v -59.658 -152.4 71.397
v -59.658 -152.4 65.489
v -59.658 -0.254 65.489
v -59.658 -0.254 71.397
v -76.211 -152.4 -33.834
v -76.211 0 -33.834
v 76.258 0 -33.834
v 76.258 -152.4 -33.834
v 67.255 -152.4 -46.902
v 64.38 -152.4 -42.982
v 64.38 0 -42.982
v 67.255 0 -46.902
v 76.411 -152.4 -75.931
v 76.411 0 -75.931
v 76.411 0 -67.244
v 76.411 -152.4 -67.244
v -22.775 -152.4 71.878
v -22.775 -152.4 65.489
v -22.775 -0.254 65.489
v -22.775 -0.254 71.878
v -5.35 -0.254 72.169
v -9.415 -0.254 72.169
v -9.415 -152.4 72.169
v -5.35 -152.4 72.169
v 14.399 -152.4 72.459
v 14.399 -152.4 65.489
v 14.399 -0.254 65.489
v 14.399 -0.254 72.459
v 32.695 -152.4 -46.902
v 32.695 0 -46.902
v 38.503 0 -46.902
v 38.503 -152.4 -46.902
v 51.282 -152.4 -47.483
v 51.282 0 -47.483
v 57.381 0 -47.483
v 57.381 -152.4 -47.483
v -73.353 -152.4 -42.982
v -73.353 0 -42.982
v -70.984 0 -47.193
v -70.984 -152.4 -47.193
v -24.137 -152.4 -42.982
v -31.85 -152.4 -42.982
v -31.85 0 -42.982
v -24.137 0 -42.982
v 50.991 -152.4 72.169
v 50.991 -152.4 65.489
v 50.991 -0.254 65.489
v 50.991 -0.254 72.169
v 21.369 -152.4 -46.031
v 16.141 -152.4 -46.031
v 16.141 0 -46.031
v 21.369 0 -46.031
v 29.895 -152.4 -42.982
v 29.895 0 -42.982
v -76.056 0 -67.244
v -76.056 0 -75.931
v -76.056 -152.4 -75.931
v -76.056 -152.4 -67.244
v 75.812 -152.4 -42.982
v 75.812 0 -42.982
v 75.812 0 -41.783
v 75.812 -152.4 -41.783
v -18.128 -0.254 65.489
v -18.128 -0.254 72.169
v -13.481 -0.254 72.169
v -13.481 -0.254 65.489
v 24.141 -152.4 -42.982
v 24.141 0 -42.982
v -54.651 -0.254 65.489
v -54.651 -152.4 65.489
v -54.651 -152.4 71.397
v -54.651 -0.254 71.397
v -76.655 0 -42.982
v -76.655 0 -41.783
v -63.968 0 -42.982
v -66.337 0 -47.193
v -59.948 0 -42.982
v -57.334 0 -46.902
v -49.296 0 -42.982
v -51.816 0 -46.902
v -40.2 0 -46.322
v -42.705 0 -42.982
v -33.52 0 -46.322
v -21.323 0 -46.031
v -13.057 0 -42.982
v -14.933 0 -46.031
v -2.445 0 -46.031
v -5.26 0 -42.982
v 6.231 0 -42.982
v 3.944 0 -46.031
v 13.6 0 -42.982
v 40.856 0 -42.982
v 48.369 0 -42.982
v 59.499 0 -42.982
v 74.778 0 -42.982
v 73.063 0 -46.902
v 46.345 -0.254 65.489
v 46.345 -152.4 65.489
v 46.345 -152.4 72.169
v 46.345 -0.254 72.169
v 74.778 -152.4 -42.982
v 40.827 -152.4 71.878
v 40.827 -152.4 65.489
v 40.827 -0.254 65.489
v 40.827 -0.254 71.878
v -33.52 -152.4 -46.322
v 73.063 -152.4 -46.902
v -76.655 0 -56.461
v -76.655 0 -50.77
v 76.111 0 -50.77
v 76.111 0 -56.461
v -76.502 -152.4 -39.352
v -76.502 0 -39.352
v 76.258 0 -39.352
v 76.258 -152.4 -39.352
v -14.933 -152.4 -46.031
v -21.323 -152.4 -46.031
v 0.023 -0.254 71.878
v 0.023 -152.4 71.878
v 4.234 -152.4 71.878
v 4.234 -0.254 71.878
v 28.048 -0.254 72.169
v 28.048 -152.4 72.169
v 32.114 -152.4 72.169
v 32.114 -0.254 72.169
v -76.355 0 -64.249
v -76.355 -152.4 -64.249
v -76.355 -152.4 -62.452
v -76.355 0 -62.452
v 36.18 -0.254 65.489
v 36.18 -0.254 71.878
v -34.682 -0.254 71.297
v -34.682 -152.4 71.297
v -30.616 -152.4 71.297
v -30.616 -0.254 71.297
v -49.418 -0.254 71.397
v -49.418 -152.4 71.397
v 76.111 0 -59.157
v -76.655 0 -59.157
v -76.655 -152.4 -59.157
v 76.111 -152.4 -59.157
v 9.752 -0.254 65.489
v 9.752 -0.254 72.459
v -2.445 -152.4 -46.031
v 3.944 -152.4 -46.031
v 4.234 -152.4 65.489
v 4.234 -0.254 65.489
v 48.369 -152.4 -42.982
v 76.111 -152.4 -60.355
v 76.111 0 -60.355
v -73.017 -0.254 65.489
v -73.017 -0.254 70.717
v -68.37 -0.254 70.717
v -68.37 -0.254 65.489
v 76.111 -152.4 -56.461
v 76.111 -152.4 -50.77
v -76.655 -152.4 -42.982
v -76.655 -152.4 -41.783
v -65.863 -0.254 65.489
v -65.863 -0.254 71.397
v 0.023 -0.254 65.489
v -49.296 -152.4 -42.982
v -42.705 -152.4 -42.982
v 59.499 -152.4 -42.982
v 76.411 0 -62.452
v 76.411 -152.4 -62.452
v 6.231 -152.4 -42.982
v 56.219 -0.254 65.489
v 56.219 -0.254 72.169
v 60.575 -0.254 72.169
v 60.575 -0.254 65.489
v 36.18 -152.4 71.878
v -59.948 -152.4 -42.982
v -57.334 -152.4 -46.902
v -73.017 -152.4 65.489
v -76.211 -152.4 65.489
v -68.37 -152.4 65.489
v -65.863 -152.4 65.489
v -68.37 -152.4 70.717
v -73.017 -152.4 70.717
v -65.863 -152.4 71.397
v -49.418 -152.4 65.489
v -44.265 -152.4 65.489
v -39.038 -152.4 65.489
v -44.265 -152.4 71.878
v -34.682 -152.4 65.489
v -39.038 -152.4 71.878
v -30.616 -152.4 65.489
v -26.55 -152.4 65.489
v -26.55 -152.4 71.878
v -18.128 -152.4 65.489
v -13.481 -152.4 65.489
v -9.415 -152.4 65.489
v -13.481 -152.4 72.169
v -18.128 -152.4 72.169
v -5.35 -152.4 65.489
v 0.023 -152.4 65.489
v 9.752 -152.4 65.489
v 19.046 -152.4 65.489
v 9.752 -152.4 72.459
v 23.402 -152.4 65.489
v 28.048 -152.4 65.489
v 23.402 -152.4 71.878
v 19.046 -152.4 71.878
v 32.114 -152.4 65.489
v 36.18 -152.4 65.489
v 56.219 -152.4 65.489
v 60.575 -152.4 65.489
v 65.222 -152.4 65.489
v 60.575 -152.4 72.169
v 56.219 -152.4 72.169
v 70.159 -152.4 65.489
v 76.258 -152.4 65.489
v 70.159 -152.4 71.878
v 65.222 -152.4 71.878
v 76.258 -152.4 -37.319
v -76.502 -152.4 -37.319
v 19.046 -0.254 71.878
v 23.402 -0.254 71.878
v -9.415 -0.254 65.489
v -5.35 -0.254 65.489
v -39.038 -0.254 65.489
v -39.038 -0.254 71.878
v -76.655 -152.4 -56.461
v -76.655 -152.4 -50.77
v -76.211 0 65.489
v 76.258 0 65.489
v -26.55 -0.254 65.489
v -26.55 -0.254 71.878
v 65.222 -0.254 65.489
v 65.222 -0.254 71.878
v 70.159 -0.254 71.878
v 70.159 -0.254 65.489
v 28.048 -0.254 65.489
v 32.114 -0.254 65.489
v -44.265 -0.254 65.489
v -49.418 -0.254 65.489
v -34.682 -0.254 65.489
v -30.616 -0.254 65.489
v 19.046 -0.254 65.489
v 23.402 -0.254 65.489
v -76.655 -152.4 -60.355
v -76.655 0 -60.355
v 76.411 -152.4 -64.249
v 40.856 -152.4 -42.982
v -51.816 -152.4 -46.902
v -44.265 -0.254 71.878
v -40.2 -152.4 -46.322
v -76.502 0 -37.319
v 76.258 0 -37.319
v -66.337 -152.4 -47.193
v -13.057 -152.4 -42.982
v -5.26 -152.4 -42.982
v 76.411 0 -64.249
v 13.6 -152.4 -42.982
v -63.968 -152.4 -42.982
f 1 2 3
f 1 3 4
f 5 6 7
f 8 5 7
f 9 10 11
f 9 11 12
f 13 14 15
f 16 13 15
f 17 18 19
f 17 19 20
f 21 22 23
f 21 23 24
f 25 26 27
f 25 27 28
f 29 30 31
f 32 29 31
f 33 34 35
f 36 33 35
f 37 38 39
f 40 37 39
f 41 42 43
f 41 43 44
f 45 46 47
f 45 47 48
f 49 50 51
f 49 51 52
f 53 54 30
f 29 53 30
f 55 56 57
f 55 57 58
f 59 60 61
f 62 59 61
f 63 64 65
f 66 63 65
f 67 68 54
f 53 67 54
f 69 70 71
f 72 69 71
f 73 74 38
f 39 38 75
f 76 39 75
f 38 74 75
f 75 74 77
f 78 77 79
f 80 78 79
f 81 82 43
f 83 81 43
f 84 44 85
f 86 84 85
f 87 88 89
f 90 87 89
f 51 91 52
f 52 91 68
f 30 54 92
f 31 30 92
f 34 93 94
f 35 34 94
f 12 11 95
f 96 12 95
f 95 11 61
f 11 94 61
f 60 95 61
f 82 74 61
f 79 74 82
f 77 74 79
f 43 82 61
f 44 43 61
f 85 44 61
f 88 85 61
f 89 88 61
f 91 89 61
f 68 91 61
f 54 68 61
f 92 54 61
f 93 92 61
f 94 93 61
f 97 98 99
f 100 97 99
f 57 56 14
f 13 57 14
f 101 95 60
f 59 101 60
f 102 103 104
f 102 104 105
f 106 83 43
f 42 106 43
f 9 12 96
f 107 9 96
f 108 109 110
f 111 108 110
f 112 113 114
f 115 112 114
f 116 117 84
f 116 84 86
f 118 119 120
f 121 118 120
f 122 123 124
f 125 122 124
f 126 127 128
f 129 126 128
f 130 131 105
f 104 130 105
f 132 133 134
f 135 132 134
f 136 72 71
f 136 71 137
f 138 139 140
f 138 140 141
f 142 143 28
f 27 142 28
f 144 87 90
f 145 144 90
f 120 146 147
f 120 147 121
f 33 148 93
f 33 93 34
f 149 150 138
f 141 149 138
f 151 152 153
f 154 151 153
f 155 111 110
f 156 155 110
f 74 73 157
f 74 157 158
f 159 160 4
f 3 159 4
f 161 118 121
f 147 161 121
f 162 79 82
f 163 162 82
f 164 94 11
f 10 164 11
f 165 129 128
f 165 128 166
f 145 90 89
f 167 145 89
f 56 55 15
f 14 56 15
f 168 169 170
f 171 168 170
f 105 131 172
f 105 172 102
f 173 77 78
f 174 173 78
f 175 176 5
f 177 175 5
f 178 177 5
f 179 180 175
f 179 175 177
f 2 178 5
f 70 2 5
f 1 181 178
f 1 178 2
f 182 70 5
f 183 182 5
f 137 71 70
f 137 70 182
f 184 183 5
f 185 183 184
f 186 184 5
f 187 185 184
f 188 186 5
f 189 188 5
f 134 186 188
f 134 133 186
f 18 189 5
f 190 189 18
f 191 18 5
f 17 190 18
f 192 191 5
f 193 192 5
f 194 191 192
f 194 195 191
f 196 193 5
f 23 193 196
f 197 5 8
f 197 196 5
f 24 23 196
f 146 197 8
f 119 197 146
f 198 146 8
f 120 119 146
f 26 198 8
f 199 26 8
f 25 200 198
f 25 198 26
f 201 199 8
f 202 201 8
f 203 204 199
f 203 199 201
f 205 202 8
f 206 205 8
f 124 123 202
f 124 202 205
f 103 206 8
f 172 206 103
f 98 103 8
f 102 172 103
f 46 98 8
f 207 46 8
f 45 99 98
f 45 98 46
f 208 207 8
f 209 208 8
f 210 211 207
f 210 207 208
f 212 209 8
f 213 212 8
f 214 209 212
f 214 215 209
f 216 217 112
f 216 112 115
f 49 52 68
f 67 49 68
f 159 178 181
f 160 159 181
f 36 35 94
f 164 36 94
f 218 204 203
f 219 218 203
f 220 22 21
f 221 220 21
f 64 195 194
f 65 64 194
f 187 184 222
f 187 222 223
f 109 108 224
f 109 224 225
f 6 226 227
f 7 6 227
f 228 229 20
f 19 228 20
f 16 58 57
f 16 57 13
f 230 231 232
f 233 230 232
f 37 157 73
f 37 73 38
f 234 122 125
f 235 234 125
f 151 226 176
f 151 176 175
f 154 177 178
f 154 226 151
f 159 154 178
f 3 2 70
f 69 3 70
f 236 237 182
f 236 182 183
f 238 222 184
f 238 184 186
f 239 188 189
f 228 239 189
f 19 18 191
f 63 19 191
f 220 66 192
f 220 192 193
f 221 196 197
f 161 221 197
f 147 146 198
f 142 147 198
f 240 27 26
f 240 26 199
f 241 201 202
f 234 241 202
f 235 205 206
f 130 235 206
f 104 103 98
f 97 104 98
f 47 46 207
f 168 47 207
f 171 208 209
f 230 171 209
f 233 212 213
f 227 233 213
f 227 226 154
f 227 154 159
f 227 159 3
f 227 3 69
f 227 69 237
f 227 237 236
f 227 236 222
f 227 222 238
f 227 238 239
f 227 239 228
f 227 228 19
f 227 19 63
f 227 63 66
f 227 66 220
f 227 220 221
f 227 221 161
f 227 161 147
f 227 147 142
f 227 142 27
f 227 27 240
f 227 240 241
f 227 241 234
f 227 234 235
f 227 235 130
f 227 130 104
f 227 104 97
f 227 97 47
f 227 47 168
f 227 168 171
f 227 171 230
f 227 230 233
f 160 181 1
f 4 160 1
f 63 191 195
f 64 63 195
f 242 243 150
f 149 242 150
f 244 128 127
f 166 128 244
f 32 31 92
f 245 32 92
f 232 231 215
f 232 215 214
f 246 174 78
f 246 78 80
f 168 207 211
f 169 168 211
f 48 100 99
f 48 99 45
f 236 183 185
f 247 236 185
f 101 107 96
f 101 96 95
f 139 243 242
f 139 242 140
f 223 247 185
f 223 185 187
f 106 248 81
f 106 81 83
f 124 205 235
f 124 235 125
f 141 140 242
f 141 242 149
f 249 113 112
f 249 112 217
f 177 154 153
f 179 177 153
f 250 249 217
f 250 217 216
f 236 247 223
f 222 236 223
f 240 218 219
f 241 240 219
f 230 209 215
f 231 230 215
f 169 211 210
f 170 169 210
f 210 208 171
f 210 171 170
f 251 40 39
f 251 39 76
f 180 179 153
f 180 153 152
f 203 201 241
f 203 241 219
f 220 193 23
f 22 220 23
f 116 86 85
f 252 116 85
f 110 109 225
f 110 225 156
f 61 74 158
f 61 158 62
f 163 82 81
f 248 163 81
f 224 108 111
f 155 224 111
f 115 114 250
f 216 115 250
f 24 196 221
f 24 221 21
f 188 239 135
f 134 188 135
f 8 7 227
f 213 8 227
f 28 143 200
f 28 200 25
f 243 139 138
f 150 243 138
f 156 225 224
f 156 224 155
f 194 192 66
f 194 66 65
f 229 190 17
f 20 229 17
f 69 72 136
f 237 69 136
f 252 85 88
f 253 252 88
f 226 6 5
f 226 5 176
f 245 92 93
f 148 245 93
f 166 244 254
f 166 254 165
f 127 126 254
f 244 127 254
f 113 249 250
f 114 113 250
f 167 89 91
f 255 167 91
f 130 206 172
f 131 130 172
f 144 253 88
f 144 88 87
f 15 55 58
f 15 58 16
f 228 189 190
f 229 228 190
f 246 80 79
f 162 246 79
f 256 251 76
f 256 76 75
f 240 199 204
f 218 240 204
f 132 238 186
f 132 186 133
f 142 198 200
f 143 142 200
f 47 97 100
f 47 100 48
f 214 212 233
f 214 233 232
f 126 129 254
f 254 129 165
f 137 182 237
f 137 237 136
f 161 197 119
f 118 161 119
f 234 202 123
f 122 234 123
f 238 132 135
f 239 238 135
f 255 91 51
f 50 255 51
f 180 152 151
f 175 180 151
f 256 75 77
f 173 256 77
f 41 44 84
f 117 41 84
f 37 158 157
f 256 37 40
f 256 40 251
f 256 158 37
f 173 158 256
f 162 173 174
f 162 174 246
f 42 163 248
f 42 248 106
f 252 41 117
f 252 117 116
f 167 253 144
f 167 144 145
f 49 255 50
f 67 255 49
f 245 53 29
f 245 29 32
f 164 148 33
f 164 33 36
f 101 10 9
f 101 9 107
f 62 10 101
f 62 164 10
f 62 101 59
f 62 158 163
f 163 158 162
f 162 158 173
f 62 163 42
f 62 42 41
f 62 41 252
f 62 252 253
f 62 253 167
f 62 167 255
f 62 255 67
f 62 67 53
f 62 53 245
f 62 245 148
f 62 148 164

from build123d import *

# Parameters (mm, degrees)
F0_W      = 152.466349
F0_H      = 8.686692
F1_DEPTH  = 152.4
F2_W      = 152.765885
F2_H      = 1.797248
F3_DEPTH  = 152.4
F4_W      = 152.765892
F4_H      = 1.198161
F5_DEPTH  = 152.4
F6_W      = 152.765892
F6_H      = 5.691275
F7_DEPTH  = 152.4
F8_W      = 152.466349
F8_H      = 1.198165
F9_DEPTH  = 152.4
F10_W     = 152.759567
F10_H     = 2.032921
F11_DEPTH = 152.4
F12_W     = 152.46915
F12_H     = 99.322758
F13_DEPTH = 152.4
F15_DEPTH = 152.4
F17_DEPTH = 152.4
F18_W     = 4.93709
F18_H     = 6.389186
F18_W_2   = 4.356266
F18_H_2   = 6.679602
F18_W_3   = 4.646678
F18_W_4   = 4.065841
F18_W_5   = 4.356261
F18_W_6   = 4.64668
F18_H_3   = 6.970018
F18_W_7   = 4.211054
F18_W_8   = 4.065844
F18_W_9   = 4.646679
F18_W_10  = 3.775427
F18_W_11  = 4.065846
F18_H_4   = 5.808354
F18_W_12  = 5.227514
F18_W_13  = 5.232293
F18_H_5   = 5.907856
F18_W_14  = 6.204977
F19_DEPTH = 152.14629


with BuildPart() as f1:
    # F0 (on Front) → F1 (new body)
    with BuildSketch(Plane.XZ):
        with Locations((0.177506, -71.587801)):
            Rectangle(F0_W, F0_H)
    extrude(amount=F1_DEPTH)


with BuildPart() as f3:
    # F2 (on Front) → F3 (new body)
    with BuildSketch(Plane.XZ):
        with Locations((0.027738, -63.35043)):
            Rectangle(F2_W, F2_H)
    extrude(amount=F3_DEPTH)


with BuildPart() as f5:
    # F4 (on Front) → F5 (new body)
    with BuildSketch(Plane.XZ):
        with Locations((-0.271801, -59.755934)):
            Rectangle(F4_W, F4_H)
    extrude(amount=F5_DEPTH)


with BuildPart() as f7:
    # F6 (on Front) → F7 (new body)
    with BuildSketch(Plane.XZ):
        with Locations((-0.271801, -53.615347)):
            Rectangle(F6_W, F6_H)
    extrude(amount=F7_DEPTH)


with BuildPart() as f9:
    # F8 (on Front) → F9 (new body)
    with BuildSketch(Plane.XZ):
        with Locations((-0.421573, -42.38256)):
            Rectangle(F8_W, F8_H)
    extrude(amount=F9_DEPTH)

    # F14 (on Front) → F15 (join)
    with BuildSketch(Plane.XZ):
        Polygon((-73.59764, -42.546153), (-70.983887, -47.192831), (-66.337205, -47.192831), (-63.723452, -42.546153), align=None)
    extrude(amount=F15_DEPTH)

    # F16 (on Front) → F17 (join)
    with BuildSketch(Plane.XZ):
        Polygon((-31.601598, -42.4847), (-60.238443, -42.546153), (-57.334267, -46.902414), (-51.816337, -46.902414), (-49.202576, -42.836569), (-42.813394, -42.836569), (-40.199637, -46.321578), (-33.520035, -46.321578), align=None)
        Polygon((75.096078, -42.255733), (-5.770196, -42.429267), (-2.445373, -46.031162), (3.943812, -46.031162), (6.557568, -42.546153), (13.237167, -42.546153), (16.141344, -46.031162), (21.368856, -46.031162), (24.27303, -42.836569), (29.79096, -42.836569), (32.695133, -46.902414), (38.503487, -46.902414), (41.117243, -42.546153), (48.087258, -42.546153), (51.281851, -47.483247), (57.380613, -47.483247), (59.703961, -42.546153), (64.060219, -42.546153), (67.254812, -46.902414), (73.063157, -46.902414), align=None)
        Polygon((-12.609982, -42.255733), (-12.725958, -42.444194), (-5.770196, -42.429267), (-5.930381, -42.255733), align=None)
        Polygon((-12.725958, -42.444194), (-24.61001, -42.469697), (-21.322506, -46.031162), (-14.933323, -46.031162), align=None)
        Polygon((-31.487115, -42.255733), (-31.601598, -42.4847), (-24.61001, -42.469697), (-24.807515, -42.255733), align=None)
    extrude(amount=F17_DEPTH)


with BuildPart() as f11:
    # F10 (on Front) → F11 (new body)
    with BuildSketch(Plane.XZ):
        with Locations((-0.122034, -38.335099)):
            Rectangle(F10_W, F10_H)
    extrude(amount=F11_DEPTH)


with BuildPart() as f13:
    # F12 (on Front) → F13 (new body)
    with BuildSketch(Plane.XZ):
        with Locations((0.023175, 15.827749)):
            Rectangle(F12_W, F12_H)
    extrude(amount=F13_DEPTH)

    # F18 (on face) → F19 (join)
    with BuildSketch(Plane.XZ.offset(152.4)):
        with Locations((67.690436, 68.683721)):
            Rectangle(F18_W, F18_H)
        with Locations((58.397077, 68.828929)):
            Rectangle(F18_W_2, F18_H_2)
        with Locations((48.668092, 68.828929)):
            Rectangle(F18_W_3, F18_H_2)
        with Locations((38.503485, 68.683721)):
            Rectangle(F18_W_3, F18_H)
        with Locations((30.081376, 68.828929)):
            Rectangle(F18_W_4, F18_H_2)
        with Locations((21.223647, 68.683721)):
            Rectangle(F18_W_5, F18_H)
        with Locations((12.075499, 68.974137)):
            Rectangle(F18_W_6, F18_H_3)
        with Locations((2.128702, 68.683721)):
            Rectangle(F18_W_7, F18_H)
        with Locations((-7.382469, 68.828929)):
            Rectangle(F18_W_8, F18_H_2)
        with Locations((-15.804574, 68.828929)):
            Rectangle(F18_W_9, F18_H_2)
        with Locations((-24.662305, 68.683721)):
            Rectangle(F18_W_10, F18_H)
        with Locations((-32.648785, 68.393305)):
            Rectangle(F18_W_11, F18_H_4)
        with Locations((-41.651726, 68.683721)):
            Rectangle(F18_W_12, F18_H)
        with Locations((-52.034377, 68.443056)):
            Rectangle(F18_W_13, F18_H_5)
        with Locations((-62.760092, 68.443056)):
            Rectangle(F18_W_14, F18_H_5)
        Polygon((-73.016807, 70.716642), (-73.016807, 65.489128), (-68.405047, 65.489128), (-68.370126, 65.489128), (-68.370126, 70.716642), align=None)
    extrude(amount=-F19_DEPTH)


solid = Compound([f1.part, f3.part, f5.part, f7.part, f9.part, f11.part, f13.part])
